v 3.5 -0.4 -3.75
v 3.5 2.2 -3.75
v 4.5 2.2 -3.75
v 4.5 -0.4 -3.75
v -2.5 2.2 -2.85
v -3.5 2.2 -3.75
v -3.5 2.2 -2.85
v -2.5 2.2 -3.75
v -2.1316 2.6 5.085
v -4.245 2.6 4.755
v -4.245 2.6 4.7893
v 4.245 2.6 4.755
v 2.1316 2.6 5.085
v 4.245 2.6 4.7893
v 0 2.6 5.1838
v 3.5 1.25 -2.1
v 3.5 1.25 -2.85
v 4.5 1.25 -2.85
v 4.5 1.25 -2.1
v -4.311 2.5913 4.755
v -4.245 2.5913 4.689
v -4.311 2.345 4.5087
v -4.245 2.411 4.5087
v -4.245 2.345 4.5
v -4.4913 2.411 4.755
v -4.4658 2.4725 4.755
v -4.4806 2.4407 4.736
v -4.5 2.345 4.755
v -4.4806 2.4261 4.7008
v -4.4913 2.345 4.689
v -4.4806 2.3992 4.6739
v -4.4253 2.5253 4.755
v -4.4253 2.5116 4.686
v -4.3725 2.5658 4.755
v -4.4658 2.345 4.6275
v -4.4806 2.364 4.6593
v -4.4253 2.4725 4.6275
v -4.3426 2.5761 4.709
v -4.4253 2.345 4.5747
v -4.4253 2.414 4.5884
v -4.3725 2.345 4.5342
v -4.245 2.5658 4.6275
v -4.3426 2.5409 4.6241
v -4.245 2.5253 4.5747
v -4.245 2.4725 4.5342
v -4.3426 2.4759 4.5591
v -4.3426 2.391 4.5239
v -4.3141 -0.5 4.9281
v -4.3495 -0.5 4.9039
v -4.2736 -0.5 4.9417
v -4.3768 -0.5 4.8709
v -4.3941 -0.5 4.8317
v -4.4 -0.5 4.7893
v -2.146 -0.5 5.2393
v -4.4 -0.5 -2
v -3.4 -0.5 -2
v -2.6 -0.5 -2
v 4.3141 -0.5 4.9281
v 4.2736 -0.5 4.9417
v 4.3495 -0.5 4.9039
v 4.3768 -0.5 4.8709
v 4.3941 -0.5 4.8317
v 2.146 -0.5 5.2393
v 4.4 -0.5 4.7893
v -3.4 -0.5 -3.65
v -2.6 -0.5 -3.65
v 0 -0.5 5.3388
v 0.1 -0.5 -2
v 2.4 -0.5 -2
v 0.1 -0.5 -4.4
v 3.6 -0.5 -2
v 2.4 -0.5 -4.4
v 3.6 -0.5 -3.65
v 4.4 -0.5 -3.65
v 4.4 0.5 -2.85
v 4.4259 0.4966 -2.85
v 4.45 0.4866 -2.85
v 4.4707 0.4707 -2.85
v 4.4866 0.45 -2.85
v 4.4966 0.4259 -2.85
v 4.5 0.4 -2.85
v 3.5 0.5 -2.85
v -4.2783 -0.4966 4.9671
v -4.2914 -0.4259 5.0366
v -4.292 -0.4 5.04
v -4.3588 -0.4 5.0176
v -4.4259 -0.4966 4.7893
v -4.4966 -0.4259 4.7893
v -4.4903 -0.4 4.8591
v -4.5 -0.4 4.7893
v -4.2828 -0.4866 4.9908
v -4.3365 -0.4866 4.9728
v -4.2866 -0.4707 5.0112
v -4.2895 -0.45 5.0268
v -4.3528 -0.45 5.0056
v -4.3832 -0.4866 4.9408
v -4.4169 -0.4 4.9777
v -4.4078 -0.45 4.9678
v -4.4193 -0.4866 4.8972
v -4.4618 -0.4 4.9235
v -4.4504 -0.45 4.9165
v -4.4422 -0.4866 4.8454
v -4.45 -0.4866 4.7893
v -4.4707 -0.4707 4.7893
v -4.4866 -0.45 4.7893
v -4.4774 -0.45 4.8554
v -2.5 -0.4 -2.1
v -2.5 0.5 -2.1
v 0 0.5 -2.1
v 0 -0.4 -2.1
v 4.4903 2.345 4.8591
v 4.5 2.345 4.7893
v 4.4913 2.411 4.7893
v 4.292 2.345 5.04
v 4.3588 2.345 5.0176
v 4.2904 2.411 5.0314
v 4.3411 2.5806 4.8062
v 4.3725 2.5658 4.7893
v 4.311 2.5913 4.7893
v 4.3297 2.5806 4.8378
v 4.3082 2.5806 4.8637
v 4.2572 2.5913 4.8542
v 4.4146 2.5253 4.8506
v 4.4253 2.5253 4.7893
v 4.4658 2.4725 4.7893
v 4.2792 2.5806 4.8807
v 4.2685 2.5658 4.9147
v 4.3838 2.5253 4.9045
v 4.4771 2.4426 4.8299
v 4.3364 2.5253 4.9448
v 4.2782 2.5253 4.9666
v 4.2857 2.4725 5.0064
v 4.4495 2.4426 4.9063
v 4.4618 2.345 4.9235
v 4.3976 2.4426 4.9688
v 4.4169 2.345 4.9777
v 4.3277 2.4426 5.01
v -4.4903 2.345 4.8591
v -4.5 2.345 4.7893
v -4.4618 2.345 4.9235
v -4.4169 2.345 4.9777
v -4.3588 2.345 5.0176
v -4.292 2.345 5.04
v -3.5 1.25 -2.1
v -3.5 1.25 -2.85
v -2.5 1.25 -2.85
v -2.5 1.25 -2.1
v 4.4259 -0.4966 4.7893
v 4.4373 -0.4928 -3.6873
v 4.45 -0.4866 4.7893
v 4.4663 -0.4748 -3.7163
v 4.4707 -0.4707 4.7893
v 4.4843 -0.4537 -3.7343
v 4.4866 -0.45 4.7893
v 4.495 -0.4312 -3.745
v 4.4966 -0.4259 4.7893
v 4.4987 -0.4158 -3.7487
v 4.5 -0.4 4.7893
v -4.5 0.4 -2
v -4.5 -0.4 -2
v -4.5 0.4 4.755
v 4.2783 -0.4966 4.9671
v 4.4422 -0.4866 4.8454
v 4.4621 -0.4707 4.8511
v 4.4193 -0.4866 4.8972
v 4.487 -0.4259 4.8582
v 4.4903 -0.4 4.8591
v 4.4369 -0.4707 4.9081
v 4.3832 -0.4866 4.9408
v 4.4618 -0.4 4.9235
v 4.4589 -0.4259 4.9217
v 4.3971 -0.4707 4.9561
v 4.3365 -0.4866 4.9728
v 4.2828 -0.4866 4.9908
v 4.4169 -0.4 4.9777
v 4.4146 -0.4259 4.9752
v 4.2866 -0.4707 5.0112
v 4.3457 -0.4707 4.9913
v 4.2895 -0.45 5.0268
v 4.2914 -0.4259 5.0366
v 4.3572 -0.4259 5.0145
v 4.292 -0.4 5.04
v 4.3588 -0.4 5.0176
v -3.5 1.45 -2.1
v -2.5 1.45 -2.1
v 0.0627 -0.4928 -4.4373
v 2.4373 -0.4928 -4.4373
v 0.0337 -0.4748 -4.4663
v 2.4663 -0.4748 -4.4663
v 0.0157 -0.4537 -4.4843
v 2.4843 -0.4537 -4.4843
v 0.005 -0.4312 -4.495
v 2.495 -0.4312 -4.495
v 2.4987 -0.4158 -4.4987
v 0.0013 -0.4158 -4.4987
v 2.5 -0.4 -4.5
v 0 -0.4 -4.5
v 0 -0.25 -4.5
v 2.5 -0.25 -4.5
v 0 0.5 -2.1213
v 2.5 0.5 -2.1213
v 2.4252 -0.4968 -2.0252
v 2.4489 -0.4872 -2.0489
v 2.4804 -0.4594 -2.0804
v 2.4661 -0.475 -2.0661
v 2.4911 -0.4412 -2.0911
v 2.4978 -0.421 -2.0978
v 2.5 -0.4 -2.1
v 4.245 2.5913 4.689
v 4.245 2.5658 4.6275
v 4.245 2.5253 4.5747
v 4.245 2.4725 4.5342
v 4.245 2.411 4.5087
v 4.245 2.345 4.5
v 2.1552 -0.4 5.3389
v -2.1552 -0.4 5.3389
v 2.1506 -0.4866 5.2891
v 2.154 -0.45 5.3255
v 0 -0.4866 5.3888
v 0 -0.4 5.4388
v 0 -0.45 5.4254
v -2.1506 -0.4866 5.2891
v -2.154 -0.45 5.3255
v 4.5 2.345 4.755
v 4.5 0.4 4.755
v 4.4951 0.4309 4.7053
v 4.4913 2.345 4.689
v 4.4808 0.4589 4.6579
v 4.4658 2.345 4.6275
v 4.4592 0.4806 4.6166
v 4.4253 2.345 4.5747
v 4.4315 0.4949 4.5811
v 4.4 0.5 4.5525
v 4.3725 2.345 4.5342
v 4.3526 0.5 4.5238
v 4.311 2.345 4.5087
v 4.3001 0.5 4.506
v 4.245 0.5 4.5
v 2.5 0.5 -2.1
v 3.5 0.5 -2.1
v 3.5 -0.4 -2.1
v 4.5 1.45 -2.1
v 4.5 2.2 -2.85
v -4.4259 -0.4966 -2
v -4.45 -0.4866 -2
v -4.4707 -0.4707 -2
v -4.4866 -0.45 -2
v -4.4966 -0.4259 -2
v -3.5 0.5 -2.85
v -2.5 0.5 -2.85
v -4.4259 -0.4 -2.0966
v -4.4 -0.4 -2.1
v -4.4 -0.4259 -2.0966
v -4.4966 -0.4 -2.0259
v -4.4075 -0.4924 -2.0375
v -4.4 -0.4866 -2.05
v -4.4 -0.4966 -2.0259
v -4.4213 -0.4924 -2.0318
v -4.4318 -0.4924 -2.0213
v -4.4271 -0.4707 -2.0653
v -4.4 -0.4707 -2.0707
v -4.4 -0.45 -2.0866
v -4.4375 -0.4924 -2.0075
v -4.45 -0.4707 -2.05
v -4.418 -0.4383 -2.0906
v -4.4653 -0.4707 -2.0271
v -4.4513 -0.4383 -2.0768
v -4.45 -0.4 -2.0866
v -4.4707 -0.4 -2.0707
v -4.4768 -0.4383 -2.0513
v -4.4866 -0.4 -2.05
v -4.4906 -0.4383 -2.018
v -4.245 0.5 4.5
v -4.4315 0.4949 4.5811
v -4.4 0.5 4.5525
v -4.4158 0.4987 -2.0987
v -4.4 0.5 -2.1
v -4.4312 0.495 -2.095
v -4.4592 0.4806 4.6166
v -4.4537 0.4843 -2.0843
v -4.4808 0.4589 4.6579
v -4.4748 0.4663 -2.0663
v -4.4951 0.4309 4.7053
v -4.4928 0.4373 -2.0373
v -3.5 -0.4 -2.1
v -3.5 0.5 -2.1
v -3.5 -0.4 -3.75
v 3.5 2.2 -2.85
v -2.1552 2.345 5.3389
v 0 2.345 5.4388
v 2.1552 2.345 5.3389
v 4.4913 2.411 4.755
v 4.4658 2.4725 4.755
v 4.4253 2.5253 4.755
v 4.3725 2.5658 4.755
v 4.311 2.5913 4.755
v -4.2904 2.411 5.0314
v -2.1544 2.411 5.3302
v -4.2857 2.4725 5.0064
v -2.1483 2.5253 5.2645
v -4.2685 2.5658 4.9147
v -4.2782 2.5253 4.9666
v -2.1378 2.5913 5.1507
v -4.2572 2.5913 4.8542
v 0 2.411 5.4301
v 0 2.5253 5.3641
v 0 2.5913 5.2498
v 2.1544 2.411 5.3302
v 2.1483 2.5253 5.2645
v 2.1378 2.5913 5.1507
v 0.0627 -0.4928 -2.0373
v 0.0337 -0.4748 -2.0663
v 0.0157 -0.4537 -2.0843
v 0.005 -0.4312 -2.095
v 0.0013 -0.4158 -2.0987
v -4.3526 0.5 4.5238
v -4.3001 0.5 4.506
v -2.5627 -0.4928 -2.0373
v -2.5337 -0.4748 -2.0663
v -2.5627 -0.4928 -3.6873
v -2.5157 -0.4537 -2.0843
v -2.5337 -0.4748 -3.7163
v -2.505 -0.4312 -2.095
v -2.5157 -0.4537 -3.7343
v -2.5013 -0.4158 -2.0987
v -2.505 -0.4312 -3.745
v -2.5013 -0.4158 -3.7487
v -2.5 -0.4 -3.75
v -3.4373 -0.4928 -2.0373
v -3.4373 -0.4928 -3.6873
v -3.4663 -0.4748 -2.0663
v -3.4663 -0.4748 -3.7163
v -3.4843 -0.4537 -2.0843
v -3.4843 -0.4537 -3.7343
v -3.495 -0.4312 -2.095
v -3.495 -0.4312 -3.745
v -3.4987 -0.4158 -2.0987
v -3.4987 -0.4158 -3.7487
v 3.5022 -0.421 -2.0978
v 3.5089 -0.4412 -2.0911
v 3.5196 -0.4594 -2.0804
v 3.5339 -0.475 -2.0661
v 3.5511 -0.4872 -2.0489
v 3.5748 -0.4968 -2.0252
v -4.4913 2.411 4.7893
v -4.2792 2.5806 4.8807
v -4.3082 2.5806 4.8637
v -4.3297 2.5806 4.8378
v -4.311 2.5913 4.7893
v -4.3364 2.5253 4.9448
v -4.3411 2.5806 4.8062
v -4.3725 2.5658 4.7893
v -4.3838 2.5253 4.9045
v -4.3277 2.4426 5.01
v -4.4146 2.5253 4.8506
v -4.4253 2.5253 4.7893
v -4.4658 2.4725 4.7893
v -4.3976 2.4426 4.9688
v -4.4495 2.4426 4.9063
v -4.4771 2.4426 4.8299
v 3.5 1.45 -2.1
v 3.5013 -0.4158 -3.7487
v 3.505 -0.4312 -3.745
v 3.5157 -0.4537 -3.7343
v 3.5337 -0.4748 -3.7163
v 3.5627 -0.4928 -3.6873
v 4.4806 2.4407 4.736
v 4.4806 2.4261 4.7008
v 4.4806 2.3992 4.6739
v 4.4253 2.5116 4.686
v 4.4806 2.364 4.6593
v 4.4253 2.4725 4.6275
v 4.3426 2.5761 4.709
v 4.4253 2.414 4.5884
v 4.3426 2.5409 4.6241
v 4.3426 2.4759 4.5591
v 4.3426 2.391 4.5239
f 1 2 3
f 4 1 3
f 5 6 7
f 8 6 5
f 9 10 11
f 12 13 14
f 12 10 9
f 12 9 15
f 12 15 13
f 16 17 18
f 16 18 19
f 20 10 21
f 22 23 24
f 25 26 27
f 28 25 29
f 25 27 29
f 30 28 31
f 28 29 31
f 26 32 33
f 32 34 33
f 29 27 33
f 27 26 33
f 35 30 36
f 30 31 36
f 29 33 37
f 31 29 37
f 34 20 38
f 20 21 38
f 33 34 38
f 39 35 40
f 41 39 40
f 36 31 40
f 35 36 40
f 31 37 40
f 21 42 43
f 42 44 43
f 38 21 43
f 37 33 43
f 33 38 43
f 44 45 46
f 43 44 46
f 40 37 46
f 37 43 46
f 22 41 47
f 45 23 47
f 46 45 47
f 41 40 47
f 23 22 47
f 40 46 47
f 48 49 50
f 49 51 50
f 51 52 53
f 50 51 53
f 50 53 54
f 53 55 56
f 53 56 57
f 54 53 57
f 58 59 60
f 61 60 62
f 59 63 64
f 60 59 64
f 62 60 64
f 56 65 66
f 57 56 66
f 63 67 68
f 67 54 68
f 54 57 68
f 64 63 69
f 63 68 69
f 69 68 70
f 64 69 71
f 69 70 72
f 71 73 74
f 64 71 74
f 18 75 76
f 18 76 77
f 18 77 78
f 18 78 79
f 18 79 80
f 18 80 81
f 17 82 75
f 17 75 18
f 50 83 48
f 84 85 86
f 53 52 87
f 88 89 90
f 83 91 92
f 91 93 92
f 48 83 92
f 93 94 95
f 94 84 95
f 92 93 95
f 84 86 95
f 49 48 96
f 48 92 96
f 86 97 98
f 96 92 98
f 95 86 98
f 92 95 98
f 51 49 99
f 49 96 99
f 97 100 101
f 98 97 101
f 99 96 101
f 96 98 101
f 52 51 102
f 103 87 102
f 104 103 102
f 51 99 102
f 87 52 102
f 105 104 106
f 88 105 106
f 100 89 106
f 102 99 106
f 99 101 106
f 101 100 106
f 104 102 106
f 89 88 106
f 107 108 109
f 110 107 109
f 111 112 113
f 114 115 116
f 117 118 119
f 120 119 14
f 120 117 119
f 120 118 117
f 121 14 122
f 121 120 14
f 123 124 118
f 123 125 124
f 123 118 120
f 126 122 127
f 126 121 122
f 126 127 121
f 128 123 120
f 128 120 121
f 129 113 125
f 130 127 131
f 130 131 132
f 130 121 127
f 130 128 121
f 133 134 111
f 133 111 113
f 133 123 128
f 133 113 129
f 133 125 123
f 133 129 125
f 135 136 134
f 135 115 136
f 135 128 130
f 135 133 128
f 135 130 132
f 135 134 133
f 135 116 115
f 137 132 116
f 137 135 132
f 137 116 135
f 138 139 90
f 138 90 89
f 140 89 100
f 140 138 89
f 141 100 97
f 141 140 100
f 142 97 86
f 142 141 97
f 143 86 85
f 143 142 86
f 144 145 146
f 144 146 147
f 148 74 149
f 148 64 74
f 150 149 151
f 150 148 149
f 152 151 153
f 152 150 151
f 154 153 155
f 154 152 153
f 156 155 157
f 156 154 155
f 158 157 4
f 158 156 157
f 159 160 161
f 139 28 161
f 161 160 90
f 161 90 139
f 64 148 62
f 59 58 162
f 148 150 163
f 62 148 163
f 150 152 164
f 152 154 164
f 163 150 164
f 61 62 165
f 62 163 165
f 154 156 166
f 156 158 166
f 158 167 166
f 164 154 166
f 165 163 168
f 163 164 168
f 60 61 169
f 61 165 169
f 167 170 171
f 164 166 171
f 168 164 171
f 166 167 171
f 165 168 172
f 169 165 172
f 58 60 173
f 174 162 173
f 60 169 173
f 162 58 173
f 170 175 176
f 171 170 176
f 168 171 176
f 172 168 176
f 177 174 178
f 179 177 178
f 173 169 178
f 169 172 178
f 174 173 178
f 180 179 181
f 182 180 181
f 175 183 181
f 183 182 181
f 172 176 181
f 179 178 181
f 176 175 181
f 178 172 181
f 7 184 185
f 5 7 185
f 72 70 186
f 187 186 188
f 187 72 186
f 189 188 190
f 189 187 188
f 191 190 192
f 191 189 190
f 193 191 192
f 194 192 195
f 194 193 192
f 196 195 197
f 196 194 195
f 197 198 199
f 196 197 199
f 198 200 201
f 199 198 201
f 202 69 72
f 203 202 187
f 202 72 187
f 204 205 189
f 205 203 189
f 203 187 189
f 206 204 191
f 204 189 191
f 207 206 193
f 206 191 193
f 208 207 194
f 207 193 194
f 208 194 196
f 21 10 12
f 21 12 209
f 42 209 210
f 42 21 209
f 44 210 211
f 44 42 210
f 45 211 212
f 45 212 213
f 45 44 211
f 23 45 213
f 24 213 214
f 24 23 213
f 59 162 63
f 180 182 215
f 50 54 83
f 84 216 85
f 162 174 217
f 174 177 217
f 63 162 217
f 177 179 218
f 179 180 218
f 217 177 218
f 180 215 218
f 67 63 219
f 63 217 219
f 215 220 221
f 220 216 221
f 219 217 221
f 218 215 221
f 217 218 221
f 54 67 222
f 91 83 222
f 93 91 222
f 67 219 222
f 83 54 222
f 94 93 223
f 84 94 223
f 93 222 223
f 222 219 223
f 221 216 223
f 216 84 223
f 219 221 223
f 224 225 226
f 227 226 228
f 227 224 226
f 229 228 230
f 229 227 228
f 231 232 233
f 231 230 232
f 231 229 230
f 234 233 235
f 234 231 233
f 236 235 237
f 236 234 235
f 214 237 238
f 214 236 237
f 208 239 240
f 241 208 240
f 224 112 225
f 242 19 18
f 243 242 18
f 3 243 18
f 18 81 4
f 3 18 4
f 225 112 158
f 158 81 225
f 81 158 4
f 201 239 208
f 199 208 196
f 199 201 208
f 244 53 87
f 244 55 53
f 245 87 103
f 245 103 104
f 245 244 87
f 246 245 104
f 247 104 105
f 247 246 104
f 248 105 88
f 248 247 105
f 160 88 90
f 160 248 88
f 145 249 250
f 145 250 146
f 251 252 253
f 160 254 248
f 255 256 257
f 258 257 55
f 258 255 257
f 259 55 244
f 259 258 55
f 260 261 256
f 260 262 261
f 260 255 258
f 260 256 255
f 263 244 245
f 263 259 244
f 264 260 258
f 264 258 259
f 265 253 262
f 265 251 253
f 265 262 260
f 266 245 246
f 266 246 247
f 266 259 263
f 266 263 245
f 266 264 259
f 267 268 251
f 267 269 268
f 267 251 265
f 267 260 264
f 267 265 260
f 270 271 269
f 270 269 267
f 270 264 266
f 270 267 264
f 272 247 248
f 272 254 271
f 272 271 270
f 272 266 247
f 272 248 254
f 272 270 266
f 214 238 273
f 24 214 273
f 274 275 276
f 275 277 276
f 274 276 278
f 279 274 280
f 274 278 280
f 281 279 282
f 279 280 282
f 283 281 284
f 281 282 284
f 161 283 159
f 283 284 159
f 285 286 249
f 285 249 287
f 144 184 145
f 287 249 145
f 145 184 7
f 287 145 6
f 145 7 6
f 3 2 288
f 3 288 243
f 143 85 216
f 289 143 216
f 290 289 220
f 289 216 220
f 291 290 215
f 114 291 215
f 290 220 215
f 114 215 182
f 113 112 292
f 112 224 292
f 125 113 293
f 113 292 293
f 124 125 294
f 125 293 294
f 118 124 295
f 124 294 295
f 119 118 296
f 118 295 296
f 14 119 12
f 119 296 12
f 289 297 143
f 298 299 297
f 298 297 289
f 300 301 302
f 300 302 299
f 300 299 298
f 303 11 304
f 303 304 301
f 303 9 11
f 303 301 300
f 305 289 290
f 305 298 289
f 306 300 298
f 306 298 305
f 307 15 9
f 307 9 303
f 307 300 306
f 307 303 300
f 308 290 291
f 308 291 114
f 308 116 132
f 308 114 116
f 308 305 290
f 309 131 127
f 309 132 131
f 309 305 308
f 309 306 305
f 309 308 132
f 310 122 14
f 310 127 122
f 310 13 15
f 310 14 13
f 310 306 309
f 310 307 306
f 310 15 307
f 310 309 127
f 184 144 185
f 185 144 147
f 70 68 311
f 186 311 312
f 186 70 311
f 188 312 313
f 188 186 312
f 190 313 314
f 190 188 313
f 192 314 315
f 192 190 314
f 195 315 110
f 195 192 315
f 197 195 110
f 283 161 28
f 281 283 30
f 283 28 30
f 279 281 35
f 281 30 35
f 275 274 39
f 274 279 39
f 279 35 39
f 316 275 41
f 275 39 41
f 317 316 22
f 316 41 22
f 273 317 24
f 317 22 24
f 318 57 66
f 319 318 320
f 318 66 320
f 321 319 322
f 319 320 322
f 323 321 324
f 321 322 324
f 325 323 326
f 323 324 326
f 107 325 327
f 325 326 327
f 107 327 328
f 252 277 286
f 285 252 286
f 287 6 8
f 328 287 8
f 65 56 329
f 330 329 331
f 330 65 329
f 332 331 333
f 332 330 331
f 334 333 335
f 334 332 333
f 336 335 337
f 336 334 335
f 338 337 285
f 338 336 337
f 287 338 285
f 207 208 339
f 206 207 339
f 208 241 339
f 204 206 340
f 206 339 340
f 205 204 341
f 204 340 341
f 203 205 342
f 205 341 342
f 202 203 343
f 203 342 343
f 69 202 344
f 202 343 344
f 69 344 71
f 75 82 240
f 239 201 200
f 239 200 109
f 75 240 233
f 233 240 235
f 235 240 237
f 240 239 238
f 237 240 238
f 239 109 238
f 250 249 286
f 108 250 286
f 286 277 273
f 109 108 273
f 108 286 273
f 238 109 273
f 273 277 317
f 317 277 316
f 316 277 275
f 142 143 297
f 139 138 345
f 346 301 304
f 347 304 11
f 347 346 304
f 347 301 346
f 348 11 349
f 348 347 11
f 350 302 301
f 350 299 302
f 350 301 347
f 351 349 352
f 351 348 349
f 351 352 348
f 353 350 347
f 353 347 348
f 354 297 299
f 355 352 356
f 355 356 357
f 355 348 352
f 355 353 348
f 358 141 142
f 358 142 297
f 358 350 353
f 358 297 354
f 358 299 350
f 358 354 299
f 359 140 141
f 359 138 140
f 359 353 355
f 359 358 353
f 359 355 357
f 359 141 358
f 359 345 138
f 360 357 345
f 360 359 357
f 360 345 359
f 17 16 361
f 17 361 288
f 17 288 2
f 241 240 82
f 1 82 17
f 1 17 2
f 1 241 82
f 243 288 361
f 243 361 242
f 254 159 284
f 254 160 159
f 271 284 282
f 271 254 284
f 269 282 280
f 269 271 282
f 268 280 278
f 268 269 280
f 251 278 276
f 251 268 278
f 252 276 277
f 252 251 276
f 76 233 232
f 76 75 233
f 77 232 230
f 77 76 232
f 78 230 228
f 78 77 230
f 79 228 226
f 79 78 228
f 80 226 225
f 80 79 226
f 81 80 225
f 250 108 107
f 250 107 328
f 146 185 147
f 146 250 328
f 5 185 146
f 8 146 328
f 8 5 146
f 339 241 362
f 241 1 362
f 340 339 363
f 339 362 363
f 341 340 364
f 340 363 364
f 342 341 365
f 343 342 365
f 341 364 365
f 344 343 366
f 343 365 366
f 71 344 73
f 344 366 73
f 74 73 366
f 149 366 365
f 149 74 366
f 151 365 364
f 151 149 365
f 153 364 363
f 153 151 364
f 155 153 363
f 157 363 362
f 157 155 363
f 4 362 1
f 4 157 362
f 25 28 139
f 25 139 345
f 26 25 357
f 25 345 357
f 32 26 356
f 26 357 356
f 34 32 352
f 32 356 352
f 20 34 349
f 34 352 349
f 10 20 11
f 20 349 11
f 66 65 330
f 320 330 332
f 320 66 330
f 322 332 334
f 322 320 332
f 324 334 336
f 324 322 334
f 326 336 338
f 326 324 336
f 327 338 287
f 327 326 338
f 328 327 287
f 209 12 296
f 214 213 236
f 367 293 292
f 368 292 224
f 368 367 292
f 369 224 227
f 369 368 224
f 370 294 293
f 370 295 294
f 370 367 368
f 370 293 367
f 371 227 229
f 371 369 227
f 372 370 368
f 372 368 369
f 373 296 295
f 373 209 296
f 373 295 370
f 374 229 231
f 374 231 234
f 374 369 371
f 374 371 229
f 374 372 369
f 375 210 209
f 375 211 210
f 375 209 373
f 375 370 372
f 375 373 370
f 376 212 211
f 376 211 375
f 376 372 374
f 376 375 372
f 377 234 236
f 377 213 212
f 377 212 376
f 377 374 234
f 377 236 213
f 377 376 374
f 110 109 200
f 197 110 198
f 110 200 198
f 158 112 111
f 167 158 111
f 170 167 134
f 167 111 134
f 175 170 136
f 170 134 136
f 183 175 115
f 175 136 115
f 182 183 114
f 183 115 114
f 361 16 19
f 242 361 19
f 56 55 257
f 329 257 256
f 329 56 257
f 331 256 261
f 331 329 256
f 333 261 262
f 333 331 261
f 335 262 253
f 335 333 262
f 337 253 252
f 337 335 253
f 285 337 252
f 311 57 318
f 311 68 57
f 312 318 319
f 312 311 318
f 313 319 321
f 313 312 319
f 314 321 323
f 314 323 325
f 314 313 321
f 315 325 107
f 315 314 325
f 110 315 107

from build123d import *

# Parameters (mm, degrees)
SKETCH1_W                = 9
SKETCH1_H                = 1
BOSS_EXTRUDE1_DEPTH      = 4.5
BOSS_EXTRUDE2_DEPTH      = 2.1
BOSS_EXTRUDE2_DEPTH_BACK = 1
FILLET1_R                = 0.255
SKETCH3_W                = 1
SKETCH3_H                = 3.438773138
SKETCH3_W_2              = 2.5
SKETCH3_H_2              = 3.613088827
SKETCH3_W_3              = 2.495866097
SKETCH3_H_3              = 3.882485801
CUT_EXTRUDE1_DEPTH       = 9
CHAMFER1_SIZE            = 0.75
CHAMFER1_SIZE2           = 2.378696102
SKETCH4_W                = 1
SKETCH4_H                = 2.4
BOSS_EXTRUDE3_DEPTH      = 1.7
SKETCH5_W                = 0.75
SKETCH5_H                = 0.75
CUT_EXTRUDE2_DEPTH       = 10.85
CHAMFER2_SIZE            = 0.75
SKETCH6_W                = 3.885576696
SKETCH6_H                = 1.699016426
SKETCH6_W_2              = 2.747974394
SKETCH6_H_2              = 0.842121185
CUT_EXTRUDE3_DEPTH       = 21.7
FILLET2_R                = 0.1


with BuildPart() as part:
    # Sketch1 → Boss-Extrude1 (new, symmetric)
    with BuildSketch(Plane.XY):
        Rectangle(SKETCH1_W, SKETCH1_H)
    extrude(amount=BOSS_EXTRUDE1_DEPTH, both=True)

    # Sketch2 → Boss-Extrude2 (add, two sides: drawn at the far end of the back side and taken through both)
    with BuildSketch(Plane(origin=(0, 0.5, 0), x_dir=(1, 0, 0), z_dir=(0, 1, 0)).offset(-BOSS_EXTRUDE2_DEPTH_BACK)):
        with BuildLine():
            Line((-4.5, -4.5), (-4.5, -5))
            ThreePointArc((-4.5, -5), (0, -5.438805544), (4.5, -5))
            Line((4.5, -5), (4.5, -4.5))
            Line((4.5, -4.5), (-4.5, -4.5))
        make_face()
    extrude(amount=BOSS_EXTRUDE2_DEPTH + BOSS_EXTRUDE2_DEPTH_BACK)

    # Fillet1
    fillet1_edges = [part.edges().sort_by_distance(p)[0] for p in [
        (0, 2.6, 4.5),
        (4.5, 2.6, 4.75),
        (0, 2.6, 5.438805544),
        (-4.5, 2.6, 4.75),
        (4.5, 1.55, 4.5),
        (-4.5, 1.55, 4.5),
        (4.5, 1.05, 5),
        (-4.5, 1.05, 5),
    ]]
    fillet(fillet1_edges, radius=FILLET1_R)

    # Sketch3 → Cut-Extrude1 (cut)
    with BuildSketch(Plane(origin=(0, 0.5, 0), x_dir=(1, 0, 0), z_dir=(0, 1, 0))):
        with Locations((3, 3.819386569)):
            Rectangle(SKETCH3_W, SKETCH3_H)
        with Locations((-1.25, 3.906544413)):
            Rectangle(SKETCH3_W_2, SKETCH3_H_2)
        with Locations((-4.747933049, 4.041242901)):
            Rectangle(SKETCH3_W_3, SKETCH3_H_3)
    extrude(amount=-CUT_EXTRUDE1_DEPTH, mode=Mode.SUBTRACT)

    # Chamfer1
    chamfer1_edges = [part.edges().sort_by_distance(p)[0] for p in [
        (1.25, 0.5, -4.5),
    ]]
    chamfer1_side = [part.faces().sort_by_distance(p)[0] for p in [
        (1.25, 0, -4.5),
    ]]
    chamfer(chamfer1_edges, length=CHAMFER1_SIZE, length2=CHAMFER1_SIZE2, reference=chamfer1_side[0])

    # Sketch4 → Boss-Extrude3 (add)
    with BuildSketch(Plane(origin=(0, 0.5, 0), x_dir=(1, 0, 0), z_dir=(0, 1, 0))):
        with Locations((4, 3.3)):
            Rectangle(SKETCH4_W, SKETCH4_H)
        with Locations((-3, 3.3)):
            Rectangle(SKETCH4_W, SKETCH4_H)
    extrude(amount=BOSS_EXTRUDE3_DEPTH)

    # Sketch5 → Cut-Extrude2 (cut, symmetric)
    with BuildSketch(Plane.ZY.offset(-3.5)):
        with Locations((-2.475, 0.875)):
            Rectangle(SKETCH5_W, SKETCH5_H)
    extrude(amount=CUT_EXTRUDE2_DEPTH, both=True, mode=Mode.SUBTRACT)

    # Chamfer2
    chamfer2_edges = [part.edges().sort_by_distance(p)[0] for p in [
        (4, 2.2, -2.1),
        (-3, 2.2, -2.1),
    ]]
    chamfer(chamfer2_edges, length=CHAMFER2_SIZE)

    # Sketch6 → Cut-Extrude3 (cut)
    with BuildSketch(Plane(origin=(0, 2.2, 0), x_dir=(1, 0, 0), z_dir=(0, 1, 0))):
        with Locations((-3.730449109, 4.599508213)):
            Rectangle(SKETCH6_W, SKETCH6_H)
        with Locations((4.565183266, 4.171060592)):
            Rectangle(SKETCH6_W_2, SKETCH6_H_2)
    extrude(amount=-CUT_EXTRUDE3_DEPTH, mode=Mode.SUBTRACT)

    # Fillet2
    fillet2_edges = [part.edges().sort_by_distance(p)[0] for p in [
        (-3.5, -0.5, -2.925),
        (-4.5, 0, -2.1),
        (-4, -0.5, -2.1),
        (-2.5, -0.5, -2.925),
        (-3, -0.5, -3.75),
        (4, -0.5, -3.75),
        (4.5, -0.5, 0.519670946),
        (0, -0.5, 5.438805544),
        (-4.5, -0.5, 1.344670946),
        (-4.441222256, -0.5, 4.952197123),
        (4.441222256, -0.5, 4.952197123),
        (-4.5, 0.5, 1.3275),
        (3, -0.5, -2.1),
        (4.5, 0.5, 0.9525),
        (2.5, -0.5, -3.3),
        (3.5, -0.5, -2.925),
        (1.25, -0.5, -4.5),
        (0, -0.5, -3.3),
        (-1.25, -0.5, -2.1),
    ]]
    fillet(fillet2_edges, radius=FILLET2_R)


solid = part.part
